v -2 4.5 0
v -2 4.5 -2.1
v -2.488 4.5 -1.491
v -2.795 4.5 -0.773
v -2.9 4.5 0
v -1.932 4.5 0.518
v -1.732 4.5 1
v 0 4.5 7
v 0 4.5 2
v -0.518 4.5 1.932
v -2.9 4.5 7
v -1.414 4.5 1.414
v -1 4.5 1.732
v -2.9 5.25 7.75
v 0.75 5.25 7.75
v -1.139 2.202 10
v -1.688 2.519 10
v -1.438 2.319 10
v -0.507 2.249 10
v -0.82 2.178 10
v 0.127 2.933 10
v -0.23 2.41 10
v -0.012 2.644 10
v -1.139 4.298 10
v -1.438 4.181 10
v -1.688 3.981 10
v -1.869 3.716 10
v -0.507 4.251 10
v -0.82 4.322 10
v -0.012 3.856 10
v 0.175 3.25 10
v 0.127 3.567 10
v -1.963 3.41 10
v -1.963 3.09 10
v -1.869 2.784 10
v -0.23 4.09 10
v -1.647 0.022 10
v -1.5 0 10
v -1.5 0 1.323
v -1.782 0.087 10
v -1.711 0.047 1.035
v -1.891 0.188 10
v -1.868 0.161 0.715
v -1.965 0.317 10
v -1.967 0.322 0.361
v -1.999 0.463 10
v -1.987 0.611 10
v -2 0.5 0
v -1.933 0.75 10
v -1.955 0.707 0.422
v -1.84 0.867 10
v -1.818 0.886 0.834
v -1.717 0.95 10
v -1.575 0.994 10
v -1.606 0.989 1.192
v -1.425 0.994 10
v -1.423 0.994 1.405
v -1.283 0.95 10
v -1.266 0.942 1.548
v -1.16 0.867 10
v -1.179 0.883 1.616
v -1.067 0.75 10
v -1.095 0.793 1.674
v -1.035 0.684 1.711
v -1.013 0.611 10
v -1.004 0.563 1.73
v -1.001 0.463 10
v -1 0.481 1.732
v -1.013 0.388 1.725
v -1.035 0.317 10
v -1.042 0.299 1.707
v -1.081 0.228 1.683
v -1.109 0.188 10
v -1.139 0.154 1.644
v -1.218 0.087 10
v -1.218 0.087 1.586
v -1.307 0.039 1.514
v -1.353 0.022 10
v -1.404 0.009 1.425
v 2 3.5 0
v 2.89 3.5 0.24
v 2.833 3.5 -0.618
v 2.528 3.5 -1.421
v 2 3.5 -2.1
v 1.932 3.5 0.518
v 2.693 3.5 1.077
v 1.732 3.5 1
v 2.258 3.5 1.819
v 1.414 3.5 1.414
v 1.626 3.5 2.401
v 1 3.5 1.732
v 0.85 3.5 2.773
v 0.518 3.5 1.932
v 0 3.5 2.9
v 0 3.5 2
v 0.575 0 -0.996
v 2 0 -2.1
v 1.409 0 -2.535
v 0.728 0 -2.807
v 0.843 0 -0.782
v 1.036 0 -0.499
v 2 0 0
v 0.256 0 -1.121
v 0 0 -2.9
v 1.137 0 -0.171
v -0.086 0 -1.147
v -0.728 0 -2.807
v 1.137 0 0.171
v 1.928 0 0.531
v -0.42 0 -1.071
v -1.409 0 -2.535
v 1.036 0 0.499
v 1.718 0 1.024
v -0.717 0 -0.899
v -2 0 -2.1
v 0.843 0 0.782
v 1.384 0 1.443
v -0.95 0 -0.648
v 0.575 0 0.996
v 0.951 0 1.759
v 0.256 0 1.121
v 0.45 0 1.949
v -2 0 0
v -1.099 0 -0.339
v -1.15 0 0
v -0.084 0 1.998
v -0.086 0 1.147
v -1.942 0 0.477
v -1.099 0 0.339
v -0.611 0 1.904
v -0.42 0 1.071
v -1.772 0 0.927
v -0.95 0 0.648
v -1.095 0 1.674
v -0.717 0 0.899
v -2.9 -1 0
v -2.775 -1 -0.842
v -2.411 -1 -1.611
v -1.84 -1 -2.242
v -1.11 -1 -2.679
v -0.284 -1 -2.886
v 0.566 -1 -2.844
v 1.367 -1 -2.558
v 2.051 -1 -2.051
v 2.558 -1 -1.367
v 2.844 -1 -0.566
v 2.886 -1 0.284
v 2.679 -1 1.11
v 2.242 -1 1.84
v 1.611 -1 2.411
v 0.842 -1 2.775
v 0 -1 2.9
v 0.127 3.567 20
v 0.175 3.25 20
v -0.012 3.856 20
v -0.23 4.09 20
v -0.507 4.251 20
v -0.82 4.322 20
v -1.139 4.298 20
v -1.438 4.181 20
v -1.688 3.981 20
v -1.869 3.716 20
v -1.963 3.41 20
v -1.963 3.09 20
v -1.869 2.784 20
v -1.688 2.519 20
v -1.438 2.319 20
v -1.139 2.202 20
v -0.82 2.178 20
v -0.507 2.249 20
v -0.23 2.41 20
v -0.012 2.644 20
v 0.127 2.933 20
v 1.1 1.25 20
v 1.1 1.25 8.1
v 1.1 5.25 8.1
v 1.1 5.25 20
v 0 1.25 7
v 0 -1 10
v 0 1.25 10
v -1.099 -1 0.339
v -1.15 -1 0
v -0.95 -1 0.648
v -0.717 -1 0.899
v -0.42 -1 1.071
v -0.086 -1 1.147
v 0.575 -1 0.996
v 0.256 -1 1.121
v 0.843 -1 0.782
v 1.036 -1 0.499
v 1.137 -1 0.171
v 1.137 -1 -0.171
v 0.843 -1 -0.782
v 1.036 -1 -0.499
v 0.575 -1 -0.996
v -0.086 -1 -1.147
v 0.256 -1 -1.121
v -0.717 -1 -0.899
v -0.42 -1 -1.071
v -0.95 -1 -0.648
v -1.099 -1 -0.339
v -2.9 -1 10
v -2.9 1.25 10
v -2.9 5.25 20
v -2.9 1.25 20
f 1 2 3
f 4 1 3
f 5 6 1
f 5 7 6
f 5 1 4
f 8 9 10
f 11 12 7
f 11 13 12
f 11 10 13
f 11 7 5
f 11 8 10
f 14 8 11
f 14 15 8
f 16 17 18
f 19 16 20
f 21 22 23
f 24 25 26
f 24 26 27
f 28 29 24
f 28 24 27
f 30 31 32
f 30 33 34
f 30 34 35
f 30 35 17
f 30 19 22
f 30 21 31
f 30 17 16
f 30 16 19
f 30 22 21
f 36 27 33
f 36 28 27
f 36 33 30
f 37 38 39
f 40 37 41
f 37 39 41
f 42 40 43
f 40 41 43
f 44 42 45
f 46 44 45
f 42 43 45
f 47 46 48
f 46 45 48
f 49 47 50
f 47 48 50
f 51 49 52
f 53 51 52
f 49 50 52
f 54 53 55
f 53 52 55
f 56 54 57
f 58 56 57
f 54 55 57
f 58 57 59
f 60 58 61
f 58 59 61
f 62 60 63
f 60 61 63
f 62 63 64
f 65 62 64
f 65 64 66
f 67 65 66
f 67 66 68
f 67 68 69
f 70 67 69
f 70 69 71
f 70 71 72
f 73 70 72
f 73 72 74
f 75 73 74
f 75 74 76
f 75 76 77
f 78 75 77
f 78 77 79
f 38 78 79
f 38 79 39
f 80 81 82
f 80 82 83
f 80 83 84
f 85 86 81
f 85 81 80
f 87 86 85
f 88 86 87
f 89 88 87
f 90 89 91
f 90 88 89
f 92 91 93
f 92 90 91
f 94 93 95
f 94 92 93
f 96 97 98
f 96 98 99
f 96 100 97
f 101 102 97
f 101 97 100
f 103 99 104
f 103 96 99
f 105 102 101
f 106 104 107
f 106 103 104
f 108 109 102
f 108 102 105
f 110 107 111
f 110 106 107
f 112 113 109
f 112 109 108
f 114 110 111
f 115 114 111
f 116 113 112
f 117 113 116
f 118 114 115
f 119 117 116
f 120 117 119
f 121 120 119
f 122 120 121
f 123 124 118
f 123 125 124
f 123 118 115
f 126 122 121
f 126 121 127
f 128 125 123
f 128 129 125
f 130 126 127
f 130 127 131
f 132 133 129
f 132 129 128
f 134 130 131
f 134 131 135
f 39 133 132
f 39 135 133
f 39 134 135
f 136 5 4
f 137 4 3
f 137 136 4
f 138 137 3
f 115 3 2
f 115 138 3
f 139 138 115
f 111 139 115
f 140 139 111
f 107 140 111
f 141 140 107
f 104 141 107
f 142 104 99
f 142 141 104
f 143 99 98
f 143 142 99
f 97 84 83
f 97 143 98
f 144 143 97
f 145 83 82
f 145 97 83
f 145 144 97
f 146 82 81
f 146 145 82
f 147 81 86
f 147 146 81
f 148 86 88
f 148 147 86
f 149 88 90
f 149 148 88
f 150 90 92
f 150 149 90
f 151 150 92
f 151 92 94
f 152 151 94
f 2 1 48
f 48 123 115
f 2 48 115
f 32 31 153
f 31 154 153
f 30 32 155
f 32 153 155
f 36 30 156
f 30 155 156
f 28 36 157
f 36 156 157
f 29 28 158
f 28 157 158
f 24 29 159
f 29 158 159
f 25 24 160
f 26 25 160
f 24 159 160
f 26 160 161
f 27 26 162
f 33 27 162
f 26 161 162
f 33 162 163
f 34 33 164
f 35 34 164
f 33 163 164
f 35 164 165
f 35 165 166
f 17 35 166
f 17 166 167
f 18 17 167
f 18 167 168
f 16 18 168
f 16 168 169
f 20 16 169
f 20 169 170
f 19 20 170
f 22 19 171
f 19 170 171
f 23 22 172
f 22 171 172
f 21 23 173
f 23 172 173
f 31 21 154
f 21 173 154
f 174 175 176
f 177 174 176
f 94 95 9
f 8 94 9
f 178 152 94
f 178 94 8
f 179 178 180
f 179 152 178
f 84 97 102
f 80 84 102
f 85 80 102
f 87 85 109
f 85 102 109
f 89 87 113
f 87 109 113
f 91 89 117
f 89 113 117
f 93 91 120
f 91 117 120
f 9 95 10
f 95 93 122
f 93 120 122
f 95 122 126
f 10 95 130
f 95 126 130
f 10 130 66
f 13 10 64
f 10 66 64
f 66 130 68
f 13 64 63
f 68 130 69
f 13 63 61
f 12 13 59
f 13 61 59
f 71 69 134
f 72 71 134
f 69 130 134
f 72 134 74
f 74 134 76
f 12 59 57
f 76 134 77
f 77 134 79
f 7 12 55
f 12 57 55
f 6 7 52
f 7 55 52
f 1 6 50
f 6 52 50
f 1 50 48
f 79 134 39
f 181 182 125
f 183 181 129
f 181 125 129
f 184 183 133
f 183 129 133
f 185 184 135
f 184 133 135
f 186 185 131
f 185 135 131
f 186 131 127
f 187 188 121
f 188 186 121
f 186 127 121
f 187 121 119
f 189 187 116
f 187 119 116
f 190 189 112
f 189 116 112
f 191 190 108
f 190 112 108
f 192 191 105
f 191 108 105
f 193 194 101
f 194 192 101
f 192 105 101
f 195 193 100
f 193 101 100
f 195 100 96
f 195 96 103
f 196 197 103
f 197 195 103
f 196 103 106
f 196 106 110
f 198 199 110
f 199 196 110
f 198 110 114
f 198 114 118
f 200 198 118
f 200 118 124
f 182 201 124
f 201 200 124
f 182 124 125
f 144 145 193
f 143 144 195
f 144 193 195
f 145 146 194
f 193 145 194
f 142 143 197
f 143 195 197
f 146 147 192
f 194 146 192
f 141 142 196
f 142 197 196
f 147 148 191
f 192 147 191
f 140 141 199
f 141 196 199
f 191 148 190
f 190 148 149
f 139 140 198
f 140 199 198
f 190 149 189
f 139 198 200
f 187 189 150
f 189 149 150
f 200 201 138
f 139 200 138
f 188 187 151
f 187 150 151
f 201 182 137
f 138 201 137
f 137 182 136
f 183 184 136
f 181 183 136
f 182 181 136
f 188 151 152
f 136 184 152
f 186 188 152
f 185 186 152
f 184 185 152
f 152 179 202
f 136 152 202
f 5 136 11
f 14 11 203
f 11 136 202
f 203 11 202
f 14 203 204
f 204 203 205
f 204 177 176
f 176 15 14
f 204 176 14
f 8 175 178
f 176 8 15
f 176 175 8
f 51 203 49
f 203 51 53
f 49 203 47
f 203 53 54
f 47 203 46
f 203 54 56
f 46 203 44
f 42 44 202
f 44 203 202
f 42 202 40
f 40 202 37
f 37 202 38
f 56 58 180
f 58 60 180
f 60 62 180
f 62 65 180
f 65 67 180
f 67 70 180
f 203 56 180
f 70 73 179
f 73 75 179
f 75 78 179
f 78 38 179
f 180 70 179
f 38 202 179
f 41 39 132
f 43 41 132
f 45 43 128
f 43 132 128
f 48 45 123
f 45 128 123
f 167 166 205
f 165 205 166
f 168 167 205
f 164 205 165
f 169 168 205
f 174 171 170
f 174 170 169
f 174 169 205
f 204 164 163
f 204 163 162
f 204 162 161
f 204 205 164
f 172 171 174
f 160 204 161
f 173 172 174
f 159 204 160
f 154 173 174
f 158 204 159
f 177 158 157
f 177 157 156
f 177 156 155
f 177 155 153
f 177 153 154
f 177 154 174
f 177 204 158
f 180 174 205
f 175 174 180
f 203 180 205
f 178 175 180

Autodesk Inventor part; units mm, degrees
ref_plane "YZ Plane" through (0, 0, 0) normal (1, 0, 0) x (0, 1, 0)
ref_plane "XZ Plane" through (0, 0, 0) normal (0, 1, 0) x (-1, 0, 0)
ref_plane "XY Plane" through (0, 0, 0) normal (0, 0, 1) x (1, 0, 0)
sketch "スケッチ1" plane through (0, 0, 0) normal (0, 1, 0) x (-1, 0, 0)
  circle A0 centre (0, 0) radius 1.15
  circle A1 centre (0, 0) radius 2
  circle A2 centre (0, 0) radius 2.9
  line L0 (-2, 0) -> (2, 0)
  line L1 (2, 0) -> (2, -2.9)
  line L2 (2, -2.9) -> (-2, -2.9)
  line L3 (-2, -2.9) -> (-2, 0)
  line L4 (0, 0) -> (0, 2.9)
  line L5 (0, 0) -> (2.9, 0)
  line L6 (2.9, 0) -> (2.9, 10)
  line L7 (2.9, 10) -> (0, 10)
  line L8 (0, 10) -> (0, 0)
  point P0 (0, 2)
  point P1 (2, -2.1)
  point P2 (-2, -2.1)
  dimension "d1" = 4
  dimension "d2" = 5.8
  dimension "d0" = 2.3
  dimension "d3" = 10
extrude "押し出し1" add sketch "スケッチ1" along normal blind 4.5 contours L5 A2 L1 | A1 L4 A2 L5 | A2 L8 L7 L6
extrude "押し出し2" add sketch "スケッチ1" along normal blind 3.5 contours A1 L3 A2 L4
extrude "押し出し3" add sketch "スケッチ1" against normal blind 1 contours L0 A1 A0 | A0 L4 A1 L0 | A0 L0 A1 L4 | L1 A2 L3 A1 | L5 A2 L1 | A1 L4 A2 L5 | A1 L3 A2 L4 | A2 L8 L7 L6
sketch "スケッチ2" plane through (-2.9, 4.5, 10) normal (0, 0, 1) x (1, 0, 0)
  line L0 (2.9, -4.5) -> (1.4, -4.5)
  line L1 (1.4, -4.5) -> (1.4, -4)
  line L2 (1.4, -4) -> (2.9, -4)
  line L3 (2.9, -4) -> (2.9, -4.5)
  dimension "d10" = 1.5
  dimension "d11" = 0.5
hole "穴1" at (-1.5, 0.5, 10) direction (0, 0, -1) diameter 1 end through all
sketch "スケッチ3" plane through (-2.9, 4.5, 10) normal (0, 0, 1) x (1, 0, 0)
  line L0 (0.9, 0) -> (0, 0) projected
  line L1 (0, 0) -> (4, 0)
  line L2 (4, 0) -> (4, -4)
  line L3 (4, -4) -> (0, -4)
  line L4 (0, -4) -> (0, 0)
  line L5 (0, 0) -> (3.25, 0)
  line L6 (3.25, 0) -> (3.25, -3.25)
  line L7 (3.25, -3.25) -> (0, -3.25)
  line L8 (0, -3.25) -> (0, 0)
  line L9 (0, 0) -> (1.625, 0)
  line L10 (1.625, 0) -> (1.625, -1.625)
  line L11 (1.625, -1.625) -> (0, -1.625)
  line L12 (0, -1.625) -> (0, 0)
  line L13 (0, -3.25) -> (4, -3.25)
  line L14 (4, -3.25) -> (4, 0.75)
  line L15 (4, 0.75) -> (0, 0.75)
  line L16 (0, 0.75) -> (0, -3.25)
  point P0 (2.9, -4.5)
  dimension "d19" = 4
  dimension "d20" = 4
  dimension "d21" = 3.25
  dimension "d22" = 3.25
  dimension "d33" = 4
  dimension "d34" = 4
extrude "押し出し4" add sketch "スケッチ3" along normal blind 10 and the other way blind 3 contours L1 L10 L11 L4 L0 | L0 L16 L15 L14 L1 | L1 L6 L7 L4 L11 L10 | L1 L2 L13 L6
chamfer "面取り1" distance 0.75 angle 45 1 edges at (-0.9, 5.25, 7)
chamfer "面取り2" distance 1.1 angle 45 1 edges at (1.1, 2.8752, 7)
sketch "スケッチ6" plane through (-2.9, 4.5, 20) normal (0, 0, 1) x (1, 0, 0)
  line L0 (0, 0) -> (0, 0.75) projected
  line L1 (0, 0.75) -> (2, 0.75)
  line L2 (2, 0.75) -> (2, -1.25)
  line L3 (2, -1.25) -> (0, -1.25)
  line L4 (0, -1.25) -> (0, 0.75)
  circle A0 centre (2, -1.25) radius 1.075
  point P0 (2.9, -4.5)
  dimension "d41" = 2
  dimension "d42" = 2
  dimension "d43" = 2.15
extrude "押し出し6" cut sketch "スケッチ6" against normal blind 10 contours A0 L2 L3 | L3 L2 A0
properties part number "srod1.7right"
